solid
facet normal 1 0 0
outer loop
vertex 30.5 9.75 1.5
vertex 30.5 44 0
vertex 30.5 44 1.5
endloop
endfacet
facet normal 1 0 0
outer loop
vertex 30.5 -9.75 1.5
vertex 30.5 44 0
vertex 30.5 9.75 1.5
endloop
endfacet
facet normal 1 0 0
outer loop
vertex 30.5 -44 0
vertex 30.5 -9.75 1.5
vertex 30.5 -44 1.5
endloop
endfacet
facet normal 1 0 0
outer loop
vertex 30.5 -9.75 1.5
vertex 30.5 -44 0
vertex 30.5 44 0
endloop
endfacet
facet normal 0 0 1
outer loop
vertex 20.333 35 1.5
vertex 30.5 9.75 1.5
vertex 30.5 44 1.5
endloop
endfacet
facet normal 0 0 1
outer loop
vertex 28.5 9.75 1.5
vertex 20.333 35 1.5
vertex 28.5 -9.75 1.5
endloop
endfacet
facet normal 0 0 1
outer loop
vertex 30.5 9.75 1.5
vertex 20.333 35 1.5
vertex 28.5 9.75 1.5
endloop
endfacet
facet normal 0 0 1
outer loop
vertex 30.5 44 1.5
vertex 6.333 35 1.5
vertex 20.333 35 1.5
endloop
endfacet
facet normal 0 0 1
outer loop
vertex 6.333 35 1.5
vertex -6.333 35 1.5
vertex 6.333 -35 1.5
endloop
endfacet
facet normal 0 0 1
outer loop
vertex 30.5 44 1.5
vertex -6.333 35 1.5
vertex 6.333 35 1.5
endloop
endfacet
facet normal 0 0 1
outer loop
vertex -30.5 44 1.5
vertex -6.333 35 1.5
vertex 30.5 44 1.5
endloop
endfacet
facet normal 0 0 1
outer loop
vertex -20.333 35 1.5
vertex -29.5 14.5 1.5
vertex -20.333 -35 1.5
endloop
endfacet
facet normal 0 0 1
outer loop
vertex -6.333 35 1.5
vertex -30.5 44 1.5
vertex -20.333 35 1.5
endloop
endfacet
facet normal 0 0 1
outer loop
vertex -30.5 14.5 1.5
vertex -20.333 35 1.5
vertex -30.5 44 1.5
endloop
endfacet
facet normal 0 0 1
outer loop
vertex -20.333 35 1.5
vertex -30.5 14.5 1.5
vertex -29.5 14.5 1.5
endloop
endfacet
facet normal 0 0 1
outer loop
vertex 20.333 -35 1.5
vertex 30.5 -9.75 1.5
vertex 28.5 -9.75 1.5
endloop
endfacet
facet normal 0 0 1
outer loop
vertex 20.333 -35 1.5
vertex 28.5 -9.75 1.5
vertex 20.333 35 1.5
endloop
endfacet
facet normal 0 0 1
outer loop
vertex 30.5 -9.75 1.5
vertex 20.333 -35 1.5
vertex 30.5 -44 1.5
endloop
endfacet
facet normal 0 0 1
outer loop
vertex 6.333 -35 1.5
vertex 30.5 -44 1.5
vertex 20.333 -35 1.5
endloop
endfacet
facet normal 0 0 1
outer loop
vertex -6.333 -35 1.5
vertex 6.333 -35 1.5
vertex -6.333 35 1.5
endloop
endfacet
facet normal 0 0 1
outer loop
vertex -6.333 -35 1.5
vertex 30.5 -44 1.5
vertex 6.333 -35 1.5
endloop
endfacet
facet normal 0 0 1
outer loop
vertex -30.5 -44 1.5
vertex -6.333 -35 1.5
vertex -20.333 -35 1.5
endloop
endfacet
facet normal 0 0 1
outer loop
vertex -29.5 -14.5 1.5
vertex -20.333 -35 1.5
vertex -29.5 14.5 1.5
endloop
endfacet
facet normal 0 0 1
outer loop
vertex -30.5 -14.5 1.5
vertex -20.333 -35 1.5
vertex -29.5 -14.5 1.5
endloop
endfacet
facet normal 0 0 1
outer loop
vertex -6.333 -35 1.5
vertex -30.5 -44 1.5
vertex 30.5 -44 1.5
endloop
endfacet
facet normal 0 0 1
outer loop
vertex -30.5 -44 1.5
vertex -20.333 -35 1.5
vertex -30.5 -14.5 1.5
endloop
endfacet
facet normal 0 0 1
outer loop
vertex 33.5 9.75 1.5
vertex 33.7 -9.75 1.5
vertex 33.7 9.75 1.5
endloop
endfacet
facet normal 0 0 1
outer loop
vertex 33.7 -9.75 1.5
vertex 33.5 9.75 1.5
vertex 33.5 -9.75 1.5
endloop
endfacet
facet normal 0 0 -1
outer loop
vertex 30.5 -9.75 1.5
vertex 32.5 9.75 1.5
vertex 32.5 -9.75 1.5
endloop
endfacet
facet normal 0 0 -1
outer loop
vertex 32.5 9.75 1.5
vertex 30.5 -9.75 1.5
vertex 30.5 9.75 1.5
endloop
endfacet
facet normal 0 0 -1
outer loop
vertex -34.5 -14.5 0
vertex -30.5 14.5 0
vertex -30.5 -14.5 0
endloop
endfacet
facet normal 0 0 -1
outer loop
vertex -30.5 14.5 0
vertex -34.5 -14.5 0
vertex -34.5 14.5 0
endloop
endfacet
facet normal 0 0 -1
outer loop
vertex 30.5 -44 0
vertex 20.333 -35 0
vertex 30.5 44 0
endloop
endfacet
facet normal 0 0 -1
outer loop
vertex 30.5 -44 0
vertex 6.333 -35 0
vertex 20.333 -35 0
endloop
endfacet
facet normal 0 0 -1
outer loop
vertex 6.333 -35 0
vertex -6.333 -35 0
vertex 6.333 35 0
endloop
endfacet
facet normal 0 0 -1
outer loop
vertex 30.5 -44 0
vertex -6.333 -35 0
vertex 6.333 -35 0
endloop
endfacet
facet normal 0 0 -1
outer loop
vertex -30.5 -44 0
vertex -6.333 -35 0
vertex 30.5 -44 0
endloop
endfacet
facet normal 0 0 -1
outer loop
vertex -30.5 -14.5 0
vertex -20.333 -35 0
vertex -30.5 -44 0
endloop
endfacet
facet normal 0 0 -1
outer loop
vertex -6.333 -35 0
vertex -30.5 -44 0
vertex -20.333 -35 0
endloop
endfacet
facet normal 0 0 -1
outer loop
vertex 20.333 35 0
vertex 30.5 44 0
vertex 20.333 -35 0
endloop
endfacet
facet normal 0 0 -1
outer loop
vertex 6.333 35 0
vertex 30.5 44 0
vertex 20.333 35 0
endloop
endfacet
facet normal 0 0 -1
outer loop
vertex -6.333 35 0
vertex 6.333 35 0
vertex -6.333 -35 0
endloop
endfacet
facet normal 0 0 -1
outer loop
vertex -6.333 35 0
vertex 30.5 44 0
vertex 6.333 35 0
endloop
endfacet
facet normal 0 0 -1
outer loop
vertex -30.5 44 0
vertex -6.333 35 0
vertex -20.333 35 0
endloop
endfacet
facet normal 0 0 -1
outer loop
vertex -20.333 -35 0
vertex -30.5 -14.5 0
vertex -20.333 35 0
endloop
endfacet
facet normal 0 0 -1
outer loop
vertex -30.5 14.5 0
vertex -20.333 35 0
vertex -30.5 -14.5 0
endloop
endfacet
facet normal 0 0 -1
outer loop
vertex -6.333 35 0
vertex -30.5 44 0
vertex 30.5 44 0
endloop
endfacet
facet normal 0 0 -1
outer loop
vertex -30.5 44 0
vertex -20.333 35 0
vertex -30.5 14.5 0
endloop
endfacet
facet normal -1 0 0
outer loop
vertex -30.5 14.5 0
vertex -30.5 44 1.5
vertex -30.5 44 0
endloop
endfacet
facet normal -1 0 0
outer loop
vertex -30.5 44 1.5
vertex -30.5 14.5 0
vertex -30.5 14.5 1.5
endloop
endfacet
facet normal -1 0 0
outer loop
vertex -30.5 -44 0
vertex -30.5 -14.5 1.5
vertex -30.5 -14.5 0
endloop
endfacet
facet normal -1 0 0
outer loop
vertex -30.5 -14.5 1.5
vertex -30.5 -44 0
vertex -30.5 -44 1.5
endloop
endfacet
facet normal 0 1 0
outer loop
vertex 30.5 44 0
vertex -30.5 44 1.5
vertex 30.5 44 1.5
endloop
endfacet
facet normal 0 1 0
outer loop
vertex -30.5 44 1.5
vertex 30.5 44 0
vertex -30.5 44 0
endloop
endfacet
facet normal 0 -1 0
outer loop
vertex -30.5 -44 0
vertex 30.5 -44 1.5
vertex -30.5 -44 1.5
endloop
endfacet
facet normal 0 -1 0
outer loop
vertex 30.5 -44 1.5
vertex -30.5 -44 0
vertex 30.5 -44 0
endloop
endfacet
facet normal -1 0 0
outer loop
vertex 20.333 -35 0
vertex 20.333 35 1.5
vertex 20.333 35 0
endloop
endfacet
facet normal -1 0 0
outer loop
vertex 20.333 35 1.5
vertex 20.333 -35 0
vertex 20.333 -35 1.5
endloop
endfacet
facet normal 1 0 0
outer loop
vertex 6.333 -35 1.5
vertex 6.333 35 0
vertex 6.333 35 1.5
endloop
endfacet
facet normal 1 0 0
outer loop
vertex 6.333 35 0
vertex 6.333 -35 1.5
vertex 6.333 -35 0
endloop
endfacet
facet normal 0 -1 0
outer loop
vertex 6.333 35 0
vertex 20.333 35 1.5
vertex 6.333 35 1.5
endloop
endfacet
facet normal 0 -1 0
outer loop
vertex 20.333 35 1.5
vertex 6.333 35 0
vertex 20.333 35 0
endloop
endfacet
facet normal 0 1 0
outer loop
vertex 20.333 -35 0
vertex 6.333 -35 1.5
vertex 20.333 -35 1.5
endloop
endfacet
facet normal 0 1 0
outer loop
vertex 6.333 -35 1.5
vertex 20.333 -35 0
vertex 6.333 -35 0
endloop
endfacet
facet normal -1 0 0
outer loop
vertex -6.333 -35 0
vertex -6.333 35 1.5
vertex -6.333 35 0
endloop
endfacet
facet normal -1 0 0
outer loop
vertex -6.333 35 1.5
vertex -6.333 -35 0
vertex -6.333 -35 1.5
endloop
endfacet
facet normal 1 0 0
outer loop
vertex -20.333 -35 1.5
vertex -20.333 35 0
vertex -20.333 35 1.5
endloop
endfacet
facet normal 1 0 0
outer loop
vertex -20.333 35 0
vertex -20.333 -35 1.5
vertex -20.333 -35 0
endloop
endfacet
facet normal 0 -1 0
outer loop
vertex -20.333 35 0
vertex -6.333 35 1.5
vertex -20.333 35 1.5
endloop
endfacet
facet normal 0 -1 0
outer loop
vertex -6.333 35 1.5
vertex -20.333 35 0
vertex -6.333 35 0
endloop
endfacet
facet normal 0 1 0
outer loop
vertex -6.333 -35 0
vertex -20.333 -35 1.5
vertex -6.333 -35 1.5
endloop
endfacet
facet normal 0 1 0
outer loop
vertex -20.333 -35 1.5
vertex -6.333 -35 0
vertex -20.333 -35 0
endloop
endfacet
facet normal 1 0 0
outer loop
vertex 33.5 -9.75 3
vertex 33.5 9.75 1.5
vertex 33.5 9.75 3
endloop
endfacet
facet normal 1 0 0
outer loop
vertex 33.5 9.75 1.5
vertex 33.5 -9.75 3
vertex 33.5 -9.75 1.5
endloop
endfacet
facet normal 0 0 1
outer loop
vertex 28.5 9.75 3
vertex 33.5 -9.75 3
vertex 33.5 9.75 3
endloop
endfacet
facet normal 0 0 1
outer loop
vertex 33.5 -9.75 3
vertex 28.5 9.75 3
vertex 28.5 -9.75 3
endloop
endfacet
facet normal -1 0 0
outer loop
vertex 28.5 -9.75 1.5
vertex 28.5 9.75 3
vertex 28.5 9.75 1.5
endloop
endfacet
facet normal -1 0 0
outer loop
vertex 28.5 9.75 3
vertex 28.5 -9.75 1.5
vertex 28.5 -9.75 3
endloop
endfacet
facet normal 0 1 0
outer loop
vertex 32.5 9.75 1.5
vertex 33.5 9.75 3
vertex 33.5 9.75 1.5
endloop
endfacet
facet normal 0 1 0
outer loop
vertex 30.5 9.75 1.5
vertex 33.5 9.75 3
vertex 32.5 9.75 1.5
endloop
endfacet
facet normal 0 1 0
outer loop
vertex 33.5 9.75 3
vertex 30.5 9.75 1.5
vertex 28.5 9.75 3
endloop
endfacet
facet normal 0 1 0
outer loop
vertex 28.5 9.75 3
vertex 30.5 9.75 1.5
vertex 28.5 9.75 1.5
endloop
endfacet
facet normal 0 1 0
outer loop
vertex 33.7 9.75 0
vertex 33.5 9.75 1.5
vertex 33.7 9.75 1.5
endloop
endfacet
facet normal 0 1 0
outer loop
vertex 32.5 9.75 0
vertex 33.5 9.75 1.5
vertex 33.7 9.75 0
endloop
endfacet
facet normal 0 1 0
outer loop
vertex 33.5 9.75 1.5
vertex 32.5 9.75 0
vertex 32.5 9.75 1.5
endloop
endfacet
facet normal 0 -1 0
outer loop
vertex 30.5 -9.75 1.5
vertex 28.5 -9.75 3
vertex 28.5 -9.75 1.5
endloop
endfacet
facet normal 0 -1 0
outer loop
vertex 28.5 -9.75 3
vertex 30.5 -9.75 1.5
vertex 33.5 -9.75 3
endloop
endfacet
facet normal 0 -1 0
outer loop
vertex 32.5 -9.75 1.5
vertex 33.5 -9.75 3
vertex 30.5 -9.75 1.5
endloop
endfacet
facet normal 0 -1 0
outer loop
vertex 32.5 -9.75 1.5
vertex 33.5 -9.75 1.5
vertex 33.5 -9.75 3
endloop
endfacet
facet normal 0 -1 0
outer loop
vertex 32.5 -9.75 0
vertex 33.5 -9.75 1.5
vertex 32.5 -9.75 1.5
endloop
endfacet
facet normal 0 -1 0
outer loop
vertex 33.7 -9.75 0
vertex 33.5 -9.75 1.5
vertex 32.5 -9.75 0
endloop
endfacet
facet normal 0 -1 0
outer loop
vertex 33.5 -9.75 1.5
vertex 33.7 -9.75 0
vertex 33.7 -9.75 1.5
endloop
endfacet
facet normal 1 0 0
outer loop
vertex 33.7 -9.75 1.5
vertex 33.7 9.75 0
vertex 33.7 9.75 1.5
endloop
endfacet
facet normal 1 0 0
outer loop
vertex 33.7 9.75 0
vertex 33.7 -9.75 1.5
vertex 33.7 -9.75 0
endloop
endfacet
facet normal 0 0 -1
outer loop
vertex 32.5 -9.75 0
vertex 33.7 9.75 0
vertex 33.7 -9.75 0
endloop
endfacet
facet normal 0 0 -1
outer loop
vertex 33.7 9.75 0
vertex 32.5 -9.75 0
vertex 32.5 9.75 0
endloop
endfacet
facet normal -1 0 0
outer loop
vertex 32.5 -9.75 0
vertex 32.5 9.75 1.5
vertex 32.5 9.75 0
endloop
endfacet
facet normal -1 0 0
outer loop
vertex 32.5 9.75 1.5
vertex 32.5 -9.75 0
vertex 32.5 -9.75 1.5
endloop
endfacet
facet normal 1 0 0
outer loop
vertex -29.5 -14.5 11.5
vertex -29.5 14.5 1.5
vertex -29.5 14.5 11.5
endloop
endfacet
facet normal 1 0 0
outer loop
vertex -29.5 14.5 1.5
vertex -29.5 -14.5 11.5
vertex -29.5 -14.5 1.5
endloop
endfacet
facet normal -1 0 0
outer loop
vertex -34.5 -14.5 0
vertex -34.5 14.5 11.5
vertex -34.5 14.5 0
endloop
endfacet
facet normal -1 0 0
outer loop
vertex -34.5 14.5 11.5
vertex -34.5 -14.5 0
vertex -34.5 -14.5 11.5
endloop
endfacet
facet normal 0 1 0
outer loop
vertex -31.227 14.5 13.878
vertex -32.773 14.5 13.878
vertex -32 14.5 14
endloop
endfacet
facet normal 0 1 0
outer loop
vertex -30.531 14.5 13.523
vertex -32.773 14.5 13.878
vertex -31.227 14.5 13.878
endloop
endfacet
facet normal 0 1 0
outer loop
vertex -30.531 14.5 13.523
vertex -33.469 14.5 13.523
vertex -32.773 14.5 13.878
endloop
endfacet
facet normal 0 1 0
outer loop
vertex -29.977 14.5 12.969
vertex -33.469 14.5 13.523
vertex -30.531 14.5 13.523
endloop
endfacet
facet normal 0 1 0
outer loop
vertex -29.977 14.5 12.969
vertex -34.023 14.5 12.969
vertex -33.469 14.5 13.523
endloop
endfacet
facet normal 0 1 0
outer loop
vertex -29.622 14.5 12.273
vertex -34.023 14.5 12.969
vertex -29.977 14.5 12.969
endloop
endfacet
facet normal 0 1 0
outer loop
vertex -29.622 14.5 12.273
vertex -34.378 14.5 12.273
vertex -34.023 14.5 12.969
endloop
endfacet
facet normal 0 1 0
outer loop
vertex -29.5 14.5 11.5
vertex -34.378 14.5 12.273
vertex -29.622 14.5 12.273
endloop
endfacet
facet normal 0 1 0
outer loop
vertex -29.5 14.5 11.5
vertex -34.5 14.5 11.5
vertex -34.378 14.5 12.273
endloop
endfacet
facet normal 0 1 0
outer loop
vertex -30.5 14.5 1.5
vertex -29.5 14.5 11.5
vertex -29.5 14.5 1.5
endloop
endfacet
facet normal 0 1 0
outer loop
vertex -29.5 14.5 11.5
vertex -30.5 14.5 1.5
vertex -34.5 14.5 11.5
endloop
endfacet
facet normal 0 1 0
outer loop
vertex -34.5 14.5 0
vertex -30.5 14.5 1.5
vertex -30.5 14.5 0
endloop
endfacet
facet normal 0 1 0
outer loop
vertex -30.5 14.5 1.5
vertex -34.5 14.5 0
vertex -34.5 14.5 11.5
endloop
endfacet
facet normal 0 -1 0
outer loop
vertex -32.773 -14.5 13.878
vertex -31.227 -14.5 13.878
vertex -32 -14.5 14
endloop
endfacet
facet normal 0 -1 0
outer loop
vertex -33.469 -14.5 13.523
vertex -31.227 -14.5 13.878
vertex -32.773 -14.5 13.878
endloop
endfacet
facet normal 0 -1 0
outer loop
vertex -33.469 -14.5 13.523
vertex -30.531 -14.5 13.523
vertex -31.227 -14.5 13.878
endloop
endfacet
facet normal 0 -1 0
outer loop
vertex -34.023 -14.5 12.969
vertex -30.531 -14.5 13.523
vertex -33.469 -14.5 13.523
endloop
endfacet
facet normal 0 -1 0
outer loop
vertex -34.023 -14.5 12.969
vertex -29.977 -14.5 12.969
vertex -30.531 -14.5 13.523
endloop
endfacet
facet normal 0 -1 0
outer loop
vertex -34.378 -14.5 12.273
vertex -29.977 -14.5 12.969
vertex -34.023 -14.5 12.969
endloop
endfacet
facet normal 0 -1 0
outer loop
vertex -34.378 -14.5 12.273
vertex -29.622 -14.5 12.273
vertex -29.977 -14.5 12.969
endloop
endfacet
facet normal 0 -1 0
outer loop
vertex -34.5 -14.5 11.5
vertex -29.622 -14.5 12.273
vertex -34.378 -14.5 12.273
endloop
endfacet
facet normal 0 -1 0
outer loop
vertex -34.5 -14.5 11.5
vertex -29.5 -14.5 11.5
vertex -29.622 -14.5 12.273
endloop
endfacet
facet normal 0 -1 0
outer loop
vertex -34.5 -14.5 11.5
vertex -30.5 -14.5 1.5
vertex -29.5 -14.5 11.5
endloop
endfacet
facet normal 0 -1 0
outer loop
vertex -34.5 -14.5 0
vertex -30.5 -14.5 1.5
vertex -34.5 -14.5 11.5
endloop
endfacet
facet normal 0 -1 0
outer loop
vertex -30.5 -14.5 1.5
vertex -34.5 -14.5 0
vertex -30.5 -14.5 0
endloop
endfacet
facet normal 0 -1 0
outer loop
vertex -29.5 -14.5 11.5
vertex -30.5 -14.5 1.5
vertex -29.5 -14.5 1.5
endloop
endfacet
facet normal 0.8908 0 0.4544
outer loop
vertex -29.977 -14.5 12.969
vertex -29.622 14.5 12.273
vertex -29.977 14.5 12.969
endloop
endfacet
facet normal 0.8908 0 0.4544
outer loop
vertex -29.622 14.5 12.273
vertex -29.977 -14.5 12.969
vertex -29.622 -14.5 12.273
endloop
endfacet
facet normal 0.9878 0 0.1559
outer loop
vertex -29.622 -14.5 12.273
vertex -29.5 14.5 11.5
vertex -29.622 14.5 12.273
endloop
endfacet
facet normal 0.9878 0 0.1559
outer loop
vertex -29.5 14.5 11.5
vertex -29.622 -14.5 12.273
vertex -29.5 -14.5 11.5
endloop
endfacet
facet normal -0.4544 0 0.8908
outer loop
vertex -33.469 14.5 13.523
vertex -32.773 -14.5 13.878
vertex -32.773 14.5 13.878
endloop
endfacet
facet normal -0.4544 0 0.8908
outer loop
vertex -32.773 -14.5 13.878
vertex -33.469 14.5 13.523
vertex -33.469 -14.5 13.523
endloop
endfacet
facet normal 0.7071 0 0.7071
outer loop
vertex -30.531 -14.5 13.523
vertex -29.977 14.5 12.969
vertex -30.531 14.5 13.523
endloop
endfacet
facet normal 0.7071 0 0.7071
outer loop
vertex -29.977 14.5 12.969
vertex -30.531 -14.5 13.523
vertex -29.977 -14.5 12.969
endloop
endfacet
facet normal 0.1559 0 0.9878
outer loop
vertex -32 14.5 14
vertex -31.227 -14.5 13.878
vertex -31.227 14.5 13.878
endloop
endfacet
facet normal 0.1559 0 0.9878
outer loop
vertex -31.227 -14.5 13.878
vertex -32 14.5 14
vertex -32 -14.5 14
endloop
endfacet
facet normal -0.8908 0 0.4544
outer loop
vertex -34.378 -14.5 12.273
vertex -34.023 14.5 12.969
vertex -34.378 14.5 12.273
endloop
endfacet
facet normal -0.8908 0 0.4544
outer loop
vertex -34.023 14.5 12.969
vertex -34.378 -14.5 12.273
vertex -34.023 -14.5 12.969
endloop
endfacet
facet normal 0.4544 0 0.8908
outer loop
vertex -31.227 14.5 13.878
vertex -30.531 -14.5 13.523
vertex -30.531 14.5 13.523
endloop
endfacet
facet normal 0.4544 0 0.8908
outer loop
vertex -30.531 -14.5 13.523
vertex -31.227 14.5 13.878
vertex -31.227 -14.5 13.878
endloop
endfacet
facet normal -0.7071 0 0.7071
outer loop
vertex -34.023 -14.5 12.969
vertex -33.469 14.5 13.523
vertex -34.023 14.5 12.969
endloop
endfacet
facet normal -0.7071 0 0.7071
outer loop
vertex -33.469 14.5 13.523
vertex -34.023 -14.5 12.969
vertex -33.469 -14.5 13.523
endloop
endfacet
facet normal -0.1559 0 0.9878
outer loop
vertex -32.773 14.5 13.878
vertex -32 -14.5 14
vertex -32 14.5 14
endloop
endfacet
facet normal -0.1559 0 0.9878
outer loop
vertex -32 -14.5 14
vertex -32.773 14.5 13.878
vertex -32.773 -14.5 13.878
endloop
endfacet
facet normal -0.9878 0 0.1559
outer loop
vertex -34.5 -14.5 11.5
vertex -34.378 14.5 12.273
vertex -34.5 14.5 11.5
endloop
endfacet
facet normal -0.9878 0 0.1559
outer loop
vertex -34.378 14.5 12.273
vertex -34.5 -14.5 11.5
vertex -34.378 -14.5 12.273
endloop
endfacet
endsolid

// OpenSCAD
thickness = 1.5;
width = 61;
length = 88;
tabWidth = 3;
tabLength = 19.5;
tabZOffset = 1.5;
tabAttachWidth = 2;
clipWidth = 5;
clipLength = 29;
clipHeight = 14;
clipAttachWidth = 1;
holeWidth = 14;
holeLength = 70;

$fn=20;

difference(){
	translate([-width/2, -length/2]) cube([width, length, thickness]);
	translate([width/3-holeWidth,-holeLength/2,-1]) cube([holeWidth,holeLength,thickness+2]);
	translate([-width/3,-holeLength/2,-1]) cube([holeWidth,holeLength,thickness+2]);
}
translate([width/2-tabAttachWidth, -tabLength/2, tabZOffset]) cube([tabAttachWidth+tabWidth, tabLength, thickness]);

translate([width/2+tabWidth-1, -tabLength/2]) cube([1.2, tabLength, thickness]);

translate([-width/2-clipWidth+clipAttachWidth, -clipLength/2]) cube([clipWidth, clipLength, clipHeight-clipWidth/2]);
		translate([-width/2-clipWidth/2+clipAttachWidth, clipLength/2, clipHeight-clipWidth/2]) rotate([90,0]	) cylinder(clipLength, clipWidth/2, clipWidth/2);
